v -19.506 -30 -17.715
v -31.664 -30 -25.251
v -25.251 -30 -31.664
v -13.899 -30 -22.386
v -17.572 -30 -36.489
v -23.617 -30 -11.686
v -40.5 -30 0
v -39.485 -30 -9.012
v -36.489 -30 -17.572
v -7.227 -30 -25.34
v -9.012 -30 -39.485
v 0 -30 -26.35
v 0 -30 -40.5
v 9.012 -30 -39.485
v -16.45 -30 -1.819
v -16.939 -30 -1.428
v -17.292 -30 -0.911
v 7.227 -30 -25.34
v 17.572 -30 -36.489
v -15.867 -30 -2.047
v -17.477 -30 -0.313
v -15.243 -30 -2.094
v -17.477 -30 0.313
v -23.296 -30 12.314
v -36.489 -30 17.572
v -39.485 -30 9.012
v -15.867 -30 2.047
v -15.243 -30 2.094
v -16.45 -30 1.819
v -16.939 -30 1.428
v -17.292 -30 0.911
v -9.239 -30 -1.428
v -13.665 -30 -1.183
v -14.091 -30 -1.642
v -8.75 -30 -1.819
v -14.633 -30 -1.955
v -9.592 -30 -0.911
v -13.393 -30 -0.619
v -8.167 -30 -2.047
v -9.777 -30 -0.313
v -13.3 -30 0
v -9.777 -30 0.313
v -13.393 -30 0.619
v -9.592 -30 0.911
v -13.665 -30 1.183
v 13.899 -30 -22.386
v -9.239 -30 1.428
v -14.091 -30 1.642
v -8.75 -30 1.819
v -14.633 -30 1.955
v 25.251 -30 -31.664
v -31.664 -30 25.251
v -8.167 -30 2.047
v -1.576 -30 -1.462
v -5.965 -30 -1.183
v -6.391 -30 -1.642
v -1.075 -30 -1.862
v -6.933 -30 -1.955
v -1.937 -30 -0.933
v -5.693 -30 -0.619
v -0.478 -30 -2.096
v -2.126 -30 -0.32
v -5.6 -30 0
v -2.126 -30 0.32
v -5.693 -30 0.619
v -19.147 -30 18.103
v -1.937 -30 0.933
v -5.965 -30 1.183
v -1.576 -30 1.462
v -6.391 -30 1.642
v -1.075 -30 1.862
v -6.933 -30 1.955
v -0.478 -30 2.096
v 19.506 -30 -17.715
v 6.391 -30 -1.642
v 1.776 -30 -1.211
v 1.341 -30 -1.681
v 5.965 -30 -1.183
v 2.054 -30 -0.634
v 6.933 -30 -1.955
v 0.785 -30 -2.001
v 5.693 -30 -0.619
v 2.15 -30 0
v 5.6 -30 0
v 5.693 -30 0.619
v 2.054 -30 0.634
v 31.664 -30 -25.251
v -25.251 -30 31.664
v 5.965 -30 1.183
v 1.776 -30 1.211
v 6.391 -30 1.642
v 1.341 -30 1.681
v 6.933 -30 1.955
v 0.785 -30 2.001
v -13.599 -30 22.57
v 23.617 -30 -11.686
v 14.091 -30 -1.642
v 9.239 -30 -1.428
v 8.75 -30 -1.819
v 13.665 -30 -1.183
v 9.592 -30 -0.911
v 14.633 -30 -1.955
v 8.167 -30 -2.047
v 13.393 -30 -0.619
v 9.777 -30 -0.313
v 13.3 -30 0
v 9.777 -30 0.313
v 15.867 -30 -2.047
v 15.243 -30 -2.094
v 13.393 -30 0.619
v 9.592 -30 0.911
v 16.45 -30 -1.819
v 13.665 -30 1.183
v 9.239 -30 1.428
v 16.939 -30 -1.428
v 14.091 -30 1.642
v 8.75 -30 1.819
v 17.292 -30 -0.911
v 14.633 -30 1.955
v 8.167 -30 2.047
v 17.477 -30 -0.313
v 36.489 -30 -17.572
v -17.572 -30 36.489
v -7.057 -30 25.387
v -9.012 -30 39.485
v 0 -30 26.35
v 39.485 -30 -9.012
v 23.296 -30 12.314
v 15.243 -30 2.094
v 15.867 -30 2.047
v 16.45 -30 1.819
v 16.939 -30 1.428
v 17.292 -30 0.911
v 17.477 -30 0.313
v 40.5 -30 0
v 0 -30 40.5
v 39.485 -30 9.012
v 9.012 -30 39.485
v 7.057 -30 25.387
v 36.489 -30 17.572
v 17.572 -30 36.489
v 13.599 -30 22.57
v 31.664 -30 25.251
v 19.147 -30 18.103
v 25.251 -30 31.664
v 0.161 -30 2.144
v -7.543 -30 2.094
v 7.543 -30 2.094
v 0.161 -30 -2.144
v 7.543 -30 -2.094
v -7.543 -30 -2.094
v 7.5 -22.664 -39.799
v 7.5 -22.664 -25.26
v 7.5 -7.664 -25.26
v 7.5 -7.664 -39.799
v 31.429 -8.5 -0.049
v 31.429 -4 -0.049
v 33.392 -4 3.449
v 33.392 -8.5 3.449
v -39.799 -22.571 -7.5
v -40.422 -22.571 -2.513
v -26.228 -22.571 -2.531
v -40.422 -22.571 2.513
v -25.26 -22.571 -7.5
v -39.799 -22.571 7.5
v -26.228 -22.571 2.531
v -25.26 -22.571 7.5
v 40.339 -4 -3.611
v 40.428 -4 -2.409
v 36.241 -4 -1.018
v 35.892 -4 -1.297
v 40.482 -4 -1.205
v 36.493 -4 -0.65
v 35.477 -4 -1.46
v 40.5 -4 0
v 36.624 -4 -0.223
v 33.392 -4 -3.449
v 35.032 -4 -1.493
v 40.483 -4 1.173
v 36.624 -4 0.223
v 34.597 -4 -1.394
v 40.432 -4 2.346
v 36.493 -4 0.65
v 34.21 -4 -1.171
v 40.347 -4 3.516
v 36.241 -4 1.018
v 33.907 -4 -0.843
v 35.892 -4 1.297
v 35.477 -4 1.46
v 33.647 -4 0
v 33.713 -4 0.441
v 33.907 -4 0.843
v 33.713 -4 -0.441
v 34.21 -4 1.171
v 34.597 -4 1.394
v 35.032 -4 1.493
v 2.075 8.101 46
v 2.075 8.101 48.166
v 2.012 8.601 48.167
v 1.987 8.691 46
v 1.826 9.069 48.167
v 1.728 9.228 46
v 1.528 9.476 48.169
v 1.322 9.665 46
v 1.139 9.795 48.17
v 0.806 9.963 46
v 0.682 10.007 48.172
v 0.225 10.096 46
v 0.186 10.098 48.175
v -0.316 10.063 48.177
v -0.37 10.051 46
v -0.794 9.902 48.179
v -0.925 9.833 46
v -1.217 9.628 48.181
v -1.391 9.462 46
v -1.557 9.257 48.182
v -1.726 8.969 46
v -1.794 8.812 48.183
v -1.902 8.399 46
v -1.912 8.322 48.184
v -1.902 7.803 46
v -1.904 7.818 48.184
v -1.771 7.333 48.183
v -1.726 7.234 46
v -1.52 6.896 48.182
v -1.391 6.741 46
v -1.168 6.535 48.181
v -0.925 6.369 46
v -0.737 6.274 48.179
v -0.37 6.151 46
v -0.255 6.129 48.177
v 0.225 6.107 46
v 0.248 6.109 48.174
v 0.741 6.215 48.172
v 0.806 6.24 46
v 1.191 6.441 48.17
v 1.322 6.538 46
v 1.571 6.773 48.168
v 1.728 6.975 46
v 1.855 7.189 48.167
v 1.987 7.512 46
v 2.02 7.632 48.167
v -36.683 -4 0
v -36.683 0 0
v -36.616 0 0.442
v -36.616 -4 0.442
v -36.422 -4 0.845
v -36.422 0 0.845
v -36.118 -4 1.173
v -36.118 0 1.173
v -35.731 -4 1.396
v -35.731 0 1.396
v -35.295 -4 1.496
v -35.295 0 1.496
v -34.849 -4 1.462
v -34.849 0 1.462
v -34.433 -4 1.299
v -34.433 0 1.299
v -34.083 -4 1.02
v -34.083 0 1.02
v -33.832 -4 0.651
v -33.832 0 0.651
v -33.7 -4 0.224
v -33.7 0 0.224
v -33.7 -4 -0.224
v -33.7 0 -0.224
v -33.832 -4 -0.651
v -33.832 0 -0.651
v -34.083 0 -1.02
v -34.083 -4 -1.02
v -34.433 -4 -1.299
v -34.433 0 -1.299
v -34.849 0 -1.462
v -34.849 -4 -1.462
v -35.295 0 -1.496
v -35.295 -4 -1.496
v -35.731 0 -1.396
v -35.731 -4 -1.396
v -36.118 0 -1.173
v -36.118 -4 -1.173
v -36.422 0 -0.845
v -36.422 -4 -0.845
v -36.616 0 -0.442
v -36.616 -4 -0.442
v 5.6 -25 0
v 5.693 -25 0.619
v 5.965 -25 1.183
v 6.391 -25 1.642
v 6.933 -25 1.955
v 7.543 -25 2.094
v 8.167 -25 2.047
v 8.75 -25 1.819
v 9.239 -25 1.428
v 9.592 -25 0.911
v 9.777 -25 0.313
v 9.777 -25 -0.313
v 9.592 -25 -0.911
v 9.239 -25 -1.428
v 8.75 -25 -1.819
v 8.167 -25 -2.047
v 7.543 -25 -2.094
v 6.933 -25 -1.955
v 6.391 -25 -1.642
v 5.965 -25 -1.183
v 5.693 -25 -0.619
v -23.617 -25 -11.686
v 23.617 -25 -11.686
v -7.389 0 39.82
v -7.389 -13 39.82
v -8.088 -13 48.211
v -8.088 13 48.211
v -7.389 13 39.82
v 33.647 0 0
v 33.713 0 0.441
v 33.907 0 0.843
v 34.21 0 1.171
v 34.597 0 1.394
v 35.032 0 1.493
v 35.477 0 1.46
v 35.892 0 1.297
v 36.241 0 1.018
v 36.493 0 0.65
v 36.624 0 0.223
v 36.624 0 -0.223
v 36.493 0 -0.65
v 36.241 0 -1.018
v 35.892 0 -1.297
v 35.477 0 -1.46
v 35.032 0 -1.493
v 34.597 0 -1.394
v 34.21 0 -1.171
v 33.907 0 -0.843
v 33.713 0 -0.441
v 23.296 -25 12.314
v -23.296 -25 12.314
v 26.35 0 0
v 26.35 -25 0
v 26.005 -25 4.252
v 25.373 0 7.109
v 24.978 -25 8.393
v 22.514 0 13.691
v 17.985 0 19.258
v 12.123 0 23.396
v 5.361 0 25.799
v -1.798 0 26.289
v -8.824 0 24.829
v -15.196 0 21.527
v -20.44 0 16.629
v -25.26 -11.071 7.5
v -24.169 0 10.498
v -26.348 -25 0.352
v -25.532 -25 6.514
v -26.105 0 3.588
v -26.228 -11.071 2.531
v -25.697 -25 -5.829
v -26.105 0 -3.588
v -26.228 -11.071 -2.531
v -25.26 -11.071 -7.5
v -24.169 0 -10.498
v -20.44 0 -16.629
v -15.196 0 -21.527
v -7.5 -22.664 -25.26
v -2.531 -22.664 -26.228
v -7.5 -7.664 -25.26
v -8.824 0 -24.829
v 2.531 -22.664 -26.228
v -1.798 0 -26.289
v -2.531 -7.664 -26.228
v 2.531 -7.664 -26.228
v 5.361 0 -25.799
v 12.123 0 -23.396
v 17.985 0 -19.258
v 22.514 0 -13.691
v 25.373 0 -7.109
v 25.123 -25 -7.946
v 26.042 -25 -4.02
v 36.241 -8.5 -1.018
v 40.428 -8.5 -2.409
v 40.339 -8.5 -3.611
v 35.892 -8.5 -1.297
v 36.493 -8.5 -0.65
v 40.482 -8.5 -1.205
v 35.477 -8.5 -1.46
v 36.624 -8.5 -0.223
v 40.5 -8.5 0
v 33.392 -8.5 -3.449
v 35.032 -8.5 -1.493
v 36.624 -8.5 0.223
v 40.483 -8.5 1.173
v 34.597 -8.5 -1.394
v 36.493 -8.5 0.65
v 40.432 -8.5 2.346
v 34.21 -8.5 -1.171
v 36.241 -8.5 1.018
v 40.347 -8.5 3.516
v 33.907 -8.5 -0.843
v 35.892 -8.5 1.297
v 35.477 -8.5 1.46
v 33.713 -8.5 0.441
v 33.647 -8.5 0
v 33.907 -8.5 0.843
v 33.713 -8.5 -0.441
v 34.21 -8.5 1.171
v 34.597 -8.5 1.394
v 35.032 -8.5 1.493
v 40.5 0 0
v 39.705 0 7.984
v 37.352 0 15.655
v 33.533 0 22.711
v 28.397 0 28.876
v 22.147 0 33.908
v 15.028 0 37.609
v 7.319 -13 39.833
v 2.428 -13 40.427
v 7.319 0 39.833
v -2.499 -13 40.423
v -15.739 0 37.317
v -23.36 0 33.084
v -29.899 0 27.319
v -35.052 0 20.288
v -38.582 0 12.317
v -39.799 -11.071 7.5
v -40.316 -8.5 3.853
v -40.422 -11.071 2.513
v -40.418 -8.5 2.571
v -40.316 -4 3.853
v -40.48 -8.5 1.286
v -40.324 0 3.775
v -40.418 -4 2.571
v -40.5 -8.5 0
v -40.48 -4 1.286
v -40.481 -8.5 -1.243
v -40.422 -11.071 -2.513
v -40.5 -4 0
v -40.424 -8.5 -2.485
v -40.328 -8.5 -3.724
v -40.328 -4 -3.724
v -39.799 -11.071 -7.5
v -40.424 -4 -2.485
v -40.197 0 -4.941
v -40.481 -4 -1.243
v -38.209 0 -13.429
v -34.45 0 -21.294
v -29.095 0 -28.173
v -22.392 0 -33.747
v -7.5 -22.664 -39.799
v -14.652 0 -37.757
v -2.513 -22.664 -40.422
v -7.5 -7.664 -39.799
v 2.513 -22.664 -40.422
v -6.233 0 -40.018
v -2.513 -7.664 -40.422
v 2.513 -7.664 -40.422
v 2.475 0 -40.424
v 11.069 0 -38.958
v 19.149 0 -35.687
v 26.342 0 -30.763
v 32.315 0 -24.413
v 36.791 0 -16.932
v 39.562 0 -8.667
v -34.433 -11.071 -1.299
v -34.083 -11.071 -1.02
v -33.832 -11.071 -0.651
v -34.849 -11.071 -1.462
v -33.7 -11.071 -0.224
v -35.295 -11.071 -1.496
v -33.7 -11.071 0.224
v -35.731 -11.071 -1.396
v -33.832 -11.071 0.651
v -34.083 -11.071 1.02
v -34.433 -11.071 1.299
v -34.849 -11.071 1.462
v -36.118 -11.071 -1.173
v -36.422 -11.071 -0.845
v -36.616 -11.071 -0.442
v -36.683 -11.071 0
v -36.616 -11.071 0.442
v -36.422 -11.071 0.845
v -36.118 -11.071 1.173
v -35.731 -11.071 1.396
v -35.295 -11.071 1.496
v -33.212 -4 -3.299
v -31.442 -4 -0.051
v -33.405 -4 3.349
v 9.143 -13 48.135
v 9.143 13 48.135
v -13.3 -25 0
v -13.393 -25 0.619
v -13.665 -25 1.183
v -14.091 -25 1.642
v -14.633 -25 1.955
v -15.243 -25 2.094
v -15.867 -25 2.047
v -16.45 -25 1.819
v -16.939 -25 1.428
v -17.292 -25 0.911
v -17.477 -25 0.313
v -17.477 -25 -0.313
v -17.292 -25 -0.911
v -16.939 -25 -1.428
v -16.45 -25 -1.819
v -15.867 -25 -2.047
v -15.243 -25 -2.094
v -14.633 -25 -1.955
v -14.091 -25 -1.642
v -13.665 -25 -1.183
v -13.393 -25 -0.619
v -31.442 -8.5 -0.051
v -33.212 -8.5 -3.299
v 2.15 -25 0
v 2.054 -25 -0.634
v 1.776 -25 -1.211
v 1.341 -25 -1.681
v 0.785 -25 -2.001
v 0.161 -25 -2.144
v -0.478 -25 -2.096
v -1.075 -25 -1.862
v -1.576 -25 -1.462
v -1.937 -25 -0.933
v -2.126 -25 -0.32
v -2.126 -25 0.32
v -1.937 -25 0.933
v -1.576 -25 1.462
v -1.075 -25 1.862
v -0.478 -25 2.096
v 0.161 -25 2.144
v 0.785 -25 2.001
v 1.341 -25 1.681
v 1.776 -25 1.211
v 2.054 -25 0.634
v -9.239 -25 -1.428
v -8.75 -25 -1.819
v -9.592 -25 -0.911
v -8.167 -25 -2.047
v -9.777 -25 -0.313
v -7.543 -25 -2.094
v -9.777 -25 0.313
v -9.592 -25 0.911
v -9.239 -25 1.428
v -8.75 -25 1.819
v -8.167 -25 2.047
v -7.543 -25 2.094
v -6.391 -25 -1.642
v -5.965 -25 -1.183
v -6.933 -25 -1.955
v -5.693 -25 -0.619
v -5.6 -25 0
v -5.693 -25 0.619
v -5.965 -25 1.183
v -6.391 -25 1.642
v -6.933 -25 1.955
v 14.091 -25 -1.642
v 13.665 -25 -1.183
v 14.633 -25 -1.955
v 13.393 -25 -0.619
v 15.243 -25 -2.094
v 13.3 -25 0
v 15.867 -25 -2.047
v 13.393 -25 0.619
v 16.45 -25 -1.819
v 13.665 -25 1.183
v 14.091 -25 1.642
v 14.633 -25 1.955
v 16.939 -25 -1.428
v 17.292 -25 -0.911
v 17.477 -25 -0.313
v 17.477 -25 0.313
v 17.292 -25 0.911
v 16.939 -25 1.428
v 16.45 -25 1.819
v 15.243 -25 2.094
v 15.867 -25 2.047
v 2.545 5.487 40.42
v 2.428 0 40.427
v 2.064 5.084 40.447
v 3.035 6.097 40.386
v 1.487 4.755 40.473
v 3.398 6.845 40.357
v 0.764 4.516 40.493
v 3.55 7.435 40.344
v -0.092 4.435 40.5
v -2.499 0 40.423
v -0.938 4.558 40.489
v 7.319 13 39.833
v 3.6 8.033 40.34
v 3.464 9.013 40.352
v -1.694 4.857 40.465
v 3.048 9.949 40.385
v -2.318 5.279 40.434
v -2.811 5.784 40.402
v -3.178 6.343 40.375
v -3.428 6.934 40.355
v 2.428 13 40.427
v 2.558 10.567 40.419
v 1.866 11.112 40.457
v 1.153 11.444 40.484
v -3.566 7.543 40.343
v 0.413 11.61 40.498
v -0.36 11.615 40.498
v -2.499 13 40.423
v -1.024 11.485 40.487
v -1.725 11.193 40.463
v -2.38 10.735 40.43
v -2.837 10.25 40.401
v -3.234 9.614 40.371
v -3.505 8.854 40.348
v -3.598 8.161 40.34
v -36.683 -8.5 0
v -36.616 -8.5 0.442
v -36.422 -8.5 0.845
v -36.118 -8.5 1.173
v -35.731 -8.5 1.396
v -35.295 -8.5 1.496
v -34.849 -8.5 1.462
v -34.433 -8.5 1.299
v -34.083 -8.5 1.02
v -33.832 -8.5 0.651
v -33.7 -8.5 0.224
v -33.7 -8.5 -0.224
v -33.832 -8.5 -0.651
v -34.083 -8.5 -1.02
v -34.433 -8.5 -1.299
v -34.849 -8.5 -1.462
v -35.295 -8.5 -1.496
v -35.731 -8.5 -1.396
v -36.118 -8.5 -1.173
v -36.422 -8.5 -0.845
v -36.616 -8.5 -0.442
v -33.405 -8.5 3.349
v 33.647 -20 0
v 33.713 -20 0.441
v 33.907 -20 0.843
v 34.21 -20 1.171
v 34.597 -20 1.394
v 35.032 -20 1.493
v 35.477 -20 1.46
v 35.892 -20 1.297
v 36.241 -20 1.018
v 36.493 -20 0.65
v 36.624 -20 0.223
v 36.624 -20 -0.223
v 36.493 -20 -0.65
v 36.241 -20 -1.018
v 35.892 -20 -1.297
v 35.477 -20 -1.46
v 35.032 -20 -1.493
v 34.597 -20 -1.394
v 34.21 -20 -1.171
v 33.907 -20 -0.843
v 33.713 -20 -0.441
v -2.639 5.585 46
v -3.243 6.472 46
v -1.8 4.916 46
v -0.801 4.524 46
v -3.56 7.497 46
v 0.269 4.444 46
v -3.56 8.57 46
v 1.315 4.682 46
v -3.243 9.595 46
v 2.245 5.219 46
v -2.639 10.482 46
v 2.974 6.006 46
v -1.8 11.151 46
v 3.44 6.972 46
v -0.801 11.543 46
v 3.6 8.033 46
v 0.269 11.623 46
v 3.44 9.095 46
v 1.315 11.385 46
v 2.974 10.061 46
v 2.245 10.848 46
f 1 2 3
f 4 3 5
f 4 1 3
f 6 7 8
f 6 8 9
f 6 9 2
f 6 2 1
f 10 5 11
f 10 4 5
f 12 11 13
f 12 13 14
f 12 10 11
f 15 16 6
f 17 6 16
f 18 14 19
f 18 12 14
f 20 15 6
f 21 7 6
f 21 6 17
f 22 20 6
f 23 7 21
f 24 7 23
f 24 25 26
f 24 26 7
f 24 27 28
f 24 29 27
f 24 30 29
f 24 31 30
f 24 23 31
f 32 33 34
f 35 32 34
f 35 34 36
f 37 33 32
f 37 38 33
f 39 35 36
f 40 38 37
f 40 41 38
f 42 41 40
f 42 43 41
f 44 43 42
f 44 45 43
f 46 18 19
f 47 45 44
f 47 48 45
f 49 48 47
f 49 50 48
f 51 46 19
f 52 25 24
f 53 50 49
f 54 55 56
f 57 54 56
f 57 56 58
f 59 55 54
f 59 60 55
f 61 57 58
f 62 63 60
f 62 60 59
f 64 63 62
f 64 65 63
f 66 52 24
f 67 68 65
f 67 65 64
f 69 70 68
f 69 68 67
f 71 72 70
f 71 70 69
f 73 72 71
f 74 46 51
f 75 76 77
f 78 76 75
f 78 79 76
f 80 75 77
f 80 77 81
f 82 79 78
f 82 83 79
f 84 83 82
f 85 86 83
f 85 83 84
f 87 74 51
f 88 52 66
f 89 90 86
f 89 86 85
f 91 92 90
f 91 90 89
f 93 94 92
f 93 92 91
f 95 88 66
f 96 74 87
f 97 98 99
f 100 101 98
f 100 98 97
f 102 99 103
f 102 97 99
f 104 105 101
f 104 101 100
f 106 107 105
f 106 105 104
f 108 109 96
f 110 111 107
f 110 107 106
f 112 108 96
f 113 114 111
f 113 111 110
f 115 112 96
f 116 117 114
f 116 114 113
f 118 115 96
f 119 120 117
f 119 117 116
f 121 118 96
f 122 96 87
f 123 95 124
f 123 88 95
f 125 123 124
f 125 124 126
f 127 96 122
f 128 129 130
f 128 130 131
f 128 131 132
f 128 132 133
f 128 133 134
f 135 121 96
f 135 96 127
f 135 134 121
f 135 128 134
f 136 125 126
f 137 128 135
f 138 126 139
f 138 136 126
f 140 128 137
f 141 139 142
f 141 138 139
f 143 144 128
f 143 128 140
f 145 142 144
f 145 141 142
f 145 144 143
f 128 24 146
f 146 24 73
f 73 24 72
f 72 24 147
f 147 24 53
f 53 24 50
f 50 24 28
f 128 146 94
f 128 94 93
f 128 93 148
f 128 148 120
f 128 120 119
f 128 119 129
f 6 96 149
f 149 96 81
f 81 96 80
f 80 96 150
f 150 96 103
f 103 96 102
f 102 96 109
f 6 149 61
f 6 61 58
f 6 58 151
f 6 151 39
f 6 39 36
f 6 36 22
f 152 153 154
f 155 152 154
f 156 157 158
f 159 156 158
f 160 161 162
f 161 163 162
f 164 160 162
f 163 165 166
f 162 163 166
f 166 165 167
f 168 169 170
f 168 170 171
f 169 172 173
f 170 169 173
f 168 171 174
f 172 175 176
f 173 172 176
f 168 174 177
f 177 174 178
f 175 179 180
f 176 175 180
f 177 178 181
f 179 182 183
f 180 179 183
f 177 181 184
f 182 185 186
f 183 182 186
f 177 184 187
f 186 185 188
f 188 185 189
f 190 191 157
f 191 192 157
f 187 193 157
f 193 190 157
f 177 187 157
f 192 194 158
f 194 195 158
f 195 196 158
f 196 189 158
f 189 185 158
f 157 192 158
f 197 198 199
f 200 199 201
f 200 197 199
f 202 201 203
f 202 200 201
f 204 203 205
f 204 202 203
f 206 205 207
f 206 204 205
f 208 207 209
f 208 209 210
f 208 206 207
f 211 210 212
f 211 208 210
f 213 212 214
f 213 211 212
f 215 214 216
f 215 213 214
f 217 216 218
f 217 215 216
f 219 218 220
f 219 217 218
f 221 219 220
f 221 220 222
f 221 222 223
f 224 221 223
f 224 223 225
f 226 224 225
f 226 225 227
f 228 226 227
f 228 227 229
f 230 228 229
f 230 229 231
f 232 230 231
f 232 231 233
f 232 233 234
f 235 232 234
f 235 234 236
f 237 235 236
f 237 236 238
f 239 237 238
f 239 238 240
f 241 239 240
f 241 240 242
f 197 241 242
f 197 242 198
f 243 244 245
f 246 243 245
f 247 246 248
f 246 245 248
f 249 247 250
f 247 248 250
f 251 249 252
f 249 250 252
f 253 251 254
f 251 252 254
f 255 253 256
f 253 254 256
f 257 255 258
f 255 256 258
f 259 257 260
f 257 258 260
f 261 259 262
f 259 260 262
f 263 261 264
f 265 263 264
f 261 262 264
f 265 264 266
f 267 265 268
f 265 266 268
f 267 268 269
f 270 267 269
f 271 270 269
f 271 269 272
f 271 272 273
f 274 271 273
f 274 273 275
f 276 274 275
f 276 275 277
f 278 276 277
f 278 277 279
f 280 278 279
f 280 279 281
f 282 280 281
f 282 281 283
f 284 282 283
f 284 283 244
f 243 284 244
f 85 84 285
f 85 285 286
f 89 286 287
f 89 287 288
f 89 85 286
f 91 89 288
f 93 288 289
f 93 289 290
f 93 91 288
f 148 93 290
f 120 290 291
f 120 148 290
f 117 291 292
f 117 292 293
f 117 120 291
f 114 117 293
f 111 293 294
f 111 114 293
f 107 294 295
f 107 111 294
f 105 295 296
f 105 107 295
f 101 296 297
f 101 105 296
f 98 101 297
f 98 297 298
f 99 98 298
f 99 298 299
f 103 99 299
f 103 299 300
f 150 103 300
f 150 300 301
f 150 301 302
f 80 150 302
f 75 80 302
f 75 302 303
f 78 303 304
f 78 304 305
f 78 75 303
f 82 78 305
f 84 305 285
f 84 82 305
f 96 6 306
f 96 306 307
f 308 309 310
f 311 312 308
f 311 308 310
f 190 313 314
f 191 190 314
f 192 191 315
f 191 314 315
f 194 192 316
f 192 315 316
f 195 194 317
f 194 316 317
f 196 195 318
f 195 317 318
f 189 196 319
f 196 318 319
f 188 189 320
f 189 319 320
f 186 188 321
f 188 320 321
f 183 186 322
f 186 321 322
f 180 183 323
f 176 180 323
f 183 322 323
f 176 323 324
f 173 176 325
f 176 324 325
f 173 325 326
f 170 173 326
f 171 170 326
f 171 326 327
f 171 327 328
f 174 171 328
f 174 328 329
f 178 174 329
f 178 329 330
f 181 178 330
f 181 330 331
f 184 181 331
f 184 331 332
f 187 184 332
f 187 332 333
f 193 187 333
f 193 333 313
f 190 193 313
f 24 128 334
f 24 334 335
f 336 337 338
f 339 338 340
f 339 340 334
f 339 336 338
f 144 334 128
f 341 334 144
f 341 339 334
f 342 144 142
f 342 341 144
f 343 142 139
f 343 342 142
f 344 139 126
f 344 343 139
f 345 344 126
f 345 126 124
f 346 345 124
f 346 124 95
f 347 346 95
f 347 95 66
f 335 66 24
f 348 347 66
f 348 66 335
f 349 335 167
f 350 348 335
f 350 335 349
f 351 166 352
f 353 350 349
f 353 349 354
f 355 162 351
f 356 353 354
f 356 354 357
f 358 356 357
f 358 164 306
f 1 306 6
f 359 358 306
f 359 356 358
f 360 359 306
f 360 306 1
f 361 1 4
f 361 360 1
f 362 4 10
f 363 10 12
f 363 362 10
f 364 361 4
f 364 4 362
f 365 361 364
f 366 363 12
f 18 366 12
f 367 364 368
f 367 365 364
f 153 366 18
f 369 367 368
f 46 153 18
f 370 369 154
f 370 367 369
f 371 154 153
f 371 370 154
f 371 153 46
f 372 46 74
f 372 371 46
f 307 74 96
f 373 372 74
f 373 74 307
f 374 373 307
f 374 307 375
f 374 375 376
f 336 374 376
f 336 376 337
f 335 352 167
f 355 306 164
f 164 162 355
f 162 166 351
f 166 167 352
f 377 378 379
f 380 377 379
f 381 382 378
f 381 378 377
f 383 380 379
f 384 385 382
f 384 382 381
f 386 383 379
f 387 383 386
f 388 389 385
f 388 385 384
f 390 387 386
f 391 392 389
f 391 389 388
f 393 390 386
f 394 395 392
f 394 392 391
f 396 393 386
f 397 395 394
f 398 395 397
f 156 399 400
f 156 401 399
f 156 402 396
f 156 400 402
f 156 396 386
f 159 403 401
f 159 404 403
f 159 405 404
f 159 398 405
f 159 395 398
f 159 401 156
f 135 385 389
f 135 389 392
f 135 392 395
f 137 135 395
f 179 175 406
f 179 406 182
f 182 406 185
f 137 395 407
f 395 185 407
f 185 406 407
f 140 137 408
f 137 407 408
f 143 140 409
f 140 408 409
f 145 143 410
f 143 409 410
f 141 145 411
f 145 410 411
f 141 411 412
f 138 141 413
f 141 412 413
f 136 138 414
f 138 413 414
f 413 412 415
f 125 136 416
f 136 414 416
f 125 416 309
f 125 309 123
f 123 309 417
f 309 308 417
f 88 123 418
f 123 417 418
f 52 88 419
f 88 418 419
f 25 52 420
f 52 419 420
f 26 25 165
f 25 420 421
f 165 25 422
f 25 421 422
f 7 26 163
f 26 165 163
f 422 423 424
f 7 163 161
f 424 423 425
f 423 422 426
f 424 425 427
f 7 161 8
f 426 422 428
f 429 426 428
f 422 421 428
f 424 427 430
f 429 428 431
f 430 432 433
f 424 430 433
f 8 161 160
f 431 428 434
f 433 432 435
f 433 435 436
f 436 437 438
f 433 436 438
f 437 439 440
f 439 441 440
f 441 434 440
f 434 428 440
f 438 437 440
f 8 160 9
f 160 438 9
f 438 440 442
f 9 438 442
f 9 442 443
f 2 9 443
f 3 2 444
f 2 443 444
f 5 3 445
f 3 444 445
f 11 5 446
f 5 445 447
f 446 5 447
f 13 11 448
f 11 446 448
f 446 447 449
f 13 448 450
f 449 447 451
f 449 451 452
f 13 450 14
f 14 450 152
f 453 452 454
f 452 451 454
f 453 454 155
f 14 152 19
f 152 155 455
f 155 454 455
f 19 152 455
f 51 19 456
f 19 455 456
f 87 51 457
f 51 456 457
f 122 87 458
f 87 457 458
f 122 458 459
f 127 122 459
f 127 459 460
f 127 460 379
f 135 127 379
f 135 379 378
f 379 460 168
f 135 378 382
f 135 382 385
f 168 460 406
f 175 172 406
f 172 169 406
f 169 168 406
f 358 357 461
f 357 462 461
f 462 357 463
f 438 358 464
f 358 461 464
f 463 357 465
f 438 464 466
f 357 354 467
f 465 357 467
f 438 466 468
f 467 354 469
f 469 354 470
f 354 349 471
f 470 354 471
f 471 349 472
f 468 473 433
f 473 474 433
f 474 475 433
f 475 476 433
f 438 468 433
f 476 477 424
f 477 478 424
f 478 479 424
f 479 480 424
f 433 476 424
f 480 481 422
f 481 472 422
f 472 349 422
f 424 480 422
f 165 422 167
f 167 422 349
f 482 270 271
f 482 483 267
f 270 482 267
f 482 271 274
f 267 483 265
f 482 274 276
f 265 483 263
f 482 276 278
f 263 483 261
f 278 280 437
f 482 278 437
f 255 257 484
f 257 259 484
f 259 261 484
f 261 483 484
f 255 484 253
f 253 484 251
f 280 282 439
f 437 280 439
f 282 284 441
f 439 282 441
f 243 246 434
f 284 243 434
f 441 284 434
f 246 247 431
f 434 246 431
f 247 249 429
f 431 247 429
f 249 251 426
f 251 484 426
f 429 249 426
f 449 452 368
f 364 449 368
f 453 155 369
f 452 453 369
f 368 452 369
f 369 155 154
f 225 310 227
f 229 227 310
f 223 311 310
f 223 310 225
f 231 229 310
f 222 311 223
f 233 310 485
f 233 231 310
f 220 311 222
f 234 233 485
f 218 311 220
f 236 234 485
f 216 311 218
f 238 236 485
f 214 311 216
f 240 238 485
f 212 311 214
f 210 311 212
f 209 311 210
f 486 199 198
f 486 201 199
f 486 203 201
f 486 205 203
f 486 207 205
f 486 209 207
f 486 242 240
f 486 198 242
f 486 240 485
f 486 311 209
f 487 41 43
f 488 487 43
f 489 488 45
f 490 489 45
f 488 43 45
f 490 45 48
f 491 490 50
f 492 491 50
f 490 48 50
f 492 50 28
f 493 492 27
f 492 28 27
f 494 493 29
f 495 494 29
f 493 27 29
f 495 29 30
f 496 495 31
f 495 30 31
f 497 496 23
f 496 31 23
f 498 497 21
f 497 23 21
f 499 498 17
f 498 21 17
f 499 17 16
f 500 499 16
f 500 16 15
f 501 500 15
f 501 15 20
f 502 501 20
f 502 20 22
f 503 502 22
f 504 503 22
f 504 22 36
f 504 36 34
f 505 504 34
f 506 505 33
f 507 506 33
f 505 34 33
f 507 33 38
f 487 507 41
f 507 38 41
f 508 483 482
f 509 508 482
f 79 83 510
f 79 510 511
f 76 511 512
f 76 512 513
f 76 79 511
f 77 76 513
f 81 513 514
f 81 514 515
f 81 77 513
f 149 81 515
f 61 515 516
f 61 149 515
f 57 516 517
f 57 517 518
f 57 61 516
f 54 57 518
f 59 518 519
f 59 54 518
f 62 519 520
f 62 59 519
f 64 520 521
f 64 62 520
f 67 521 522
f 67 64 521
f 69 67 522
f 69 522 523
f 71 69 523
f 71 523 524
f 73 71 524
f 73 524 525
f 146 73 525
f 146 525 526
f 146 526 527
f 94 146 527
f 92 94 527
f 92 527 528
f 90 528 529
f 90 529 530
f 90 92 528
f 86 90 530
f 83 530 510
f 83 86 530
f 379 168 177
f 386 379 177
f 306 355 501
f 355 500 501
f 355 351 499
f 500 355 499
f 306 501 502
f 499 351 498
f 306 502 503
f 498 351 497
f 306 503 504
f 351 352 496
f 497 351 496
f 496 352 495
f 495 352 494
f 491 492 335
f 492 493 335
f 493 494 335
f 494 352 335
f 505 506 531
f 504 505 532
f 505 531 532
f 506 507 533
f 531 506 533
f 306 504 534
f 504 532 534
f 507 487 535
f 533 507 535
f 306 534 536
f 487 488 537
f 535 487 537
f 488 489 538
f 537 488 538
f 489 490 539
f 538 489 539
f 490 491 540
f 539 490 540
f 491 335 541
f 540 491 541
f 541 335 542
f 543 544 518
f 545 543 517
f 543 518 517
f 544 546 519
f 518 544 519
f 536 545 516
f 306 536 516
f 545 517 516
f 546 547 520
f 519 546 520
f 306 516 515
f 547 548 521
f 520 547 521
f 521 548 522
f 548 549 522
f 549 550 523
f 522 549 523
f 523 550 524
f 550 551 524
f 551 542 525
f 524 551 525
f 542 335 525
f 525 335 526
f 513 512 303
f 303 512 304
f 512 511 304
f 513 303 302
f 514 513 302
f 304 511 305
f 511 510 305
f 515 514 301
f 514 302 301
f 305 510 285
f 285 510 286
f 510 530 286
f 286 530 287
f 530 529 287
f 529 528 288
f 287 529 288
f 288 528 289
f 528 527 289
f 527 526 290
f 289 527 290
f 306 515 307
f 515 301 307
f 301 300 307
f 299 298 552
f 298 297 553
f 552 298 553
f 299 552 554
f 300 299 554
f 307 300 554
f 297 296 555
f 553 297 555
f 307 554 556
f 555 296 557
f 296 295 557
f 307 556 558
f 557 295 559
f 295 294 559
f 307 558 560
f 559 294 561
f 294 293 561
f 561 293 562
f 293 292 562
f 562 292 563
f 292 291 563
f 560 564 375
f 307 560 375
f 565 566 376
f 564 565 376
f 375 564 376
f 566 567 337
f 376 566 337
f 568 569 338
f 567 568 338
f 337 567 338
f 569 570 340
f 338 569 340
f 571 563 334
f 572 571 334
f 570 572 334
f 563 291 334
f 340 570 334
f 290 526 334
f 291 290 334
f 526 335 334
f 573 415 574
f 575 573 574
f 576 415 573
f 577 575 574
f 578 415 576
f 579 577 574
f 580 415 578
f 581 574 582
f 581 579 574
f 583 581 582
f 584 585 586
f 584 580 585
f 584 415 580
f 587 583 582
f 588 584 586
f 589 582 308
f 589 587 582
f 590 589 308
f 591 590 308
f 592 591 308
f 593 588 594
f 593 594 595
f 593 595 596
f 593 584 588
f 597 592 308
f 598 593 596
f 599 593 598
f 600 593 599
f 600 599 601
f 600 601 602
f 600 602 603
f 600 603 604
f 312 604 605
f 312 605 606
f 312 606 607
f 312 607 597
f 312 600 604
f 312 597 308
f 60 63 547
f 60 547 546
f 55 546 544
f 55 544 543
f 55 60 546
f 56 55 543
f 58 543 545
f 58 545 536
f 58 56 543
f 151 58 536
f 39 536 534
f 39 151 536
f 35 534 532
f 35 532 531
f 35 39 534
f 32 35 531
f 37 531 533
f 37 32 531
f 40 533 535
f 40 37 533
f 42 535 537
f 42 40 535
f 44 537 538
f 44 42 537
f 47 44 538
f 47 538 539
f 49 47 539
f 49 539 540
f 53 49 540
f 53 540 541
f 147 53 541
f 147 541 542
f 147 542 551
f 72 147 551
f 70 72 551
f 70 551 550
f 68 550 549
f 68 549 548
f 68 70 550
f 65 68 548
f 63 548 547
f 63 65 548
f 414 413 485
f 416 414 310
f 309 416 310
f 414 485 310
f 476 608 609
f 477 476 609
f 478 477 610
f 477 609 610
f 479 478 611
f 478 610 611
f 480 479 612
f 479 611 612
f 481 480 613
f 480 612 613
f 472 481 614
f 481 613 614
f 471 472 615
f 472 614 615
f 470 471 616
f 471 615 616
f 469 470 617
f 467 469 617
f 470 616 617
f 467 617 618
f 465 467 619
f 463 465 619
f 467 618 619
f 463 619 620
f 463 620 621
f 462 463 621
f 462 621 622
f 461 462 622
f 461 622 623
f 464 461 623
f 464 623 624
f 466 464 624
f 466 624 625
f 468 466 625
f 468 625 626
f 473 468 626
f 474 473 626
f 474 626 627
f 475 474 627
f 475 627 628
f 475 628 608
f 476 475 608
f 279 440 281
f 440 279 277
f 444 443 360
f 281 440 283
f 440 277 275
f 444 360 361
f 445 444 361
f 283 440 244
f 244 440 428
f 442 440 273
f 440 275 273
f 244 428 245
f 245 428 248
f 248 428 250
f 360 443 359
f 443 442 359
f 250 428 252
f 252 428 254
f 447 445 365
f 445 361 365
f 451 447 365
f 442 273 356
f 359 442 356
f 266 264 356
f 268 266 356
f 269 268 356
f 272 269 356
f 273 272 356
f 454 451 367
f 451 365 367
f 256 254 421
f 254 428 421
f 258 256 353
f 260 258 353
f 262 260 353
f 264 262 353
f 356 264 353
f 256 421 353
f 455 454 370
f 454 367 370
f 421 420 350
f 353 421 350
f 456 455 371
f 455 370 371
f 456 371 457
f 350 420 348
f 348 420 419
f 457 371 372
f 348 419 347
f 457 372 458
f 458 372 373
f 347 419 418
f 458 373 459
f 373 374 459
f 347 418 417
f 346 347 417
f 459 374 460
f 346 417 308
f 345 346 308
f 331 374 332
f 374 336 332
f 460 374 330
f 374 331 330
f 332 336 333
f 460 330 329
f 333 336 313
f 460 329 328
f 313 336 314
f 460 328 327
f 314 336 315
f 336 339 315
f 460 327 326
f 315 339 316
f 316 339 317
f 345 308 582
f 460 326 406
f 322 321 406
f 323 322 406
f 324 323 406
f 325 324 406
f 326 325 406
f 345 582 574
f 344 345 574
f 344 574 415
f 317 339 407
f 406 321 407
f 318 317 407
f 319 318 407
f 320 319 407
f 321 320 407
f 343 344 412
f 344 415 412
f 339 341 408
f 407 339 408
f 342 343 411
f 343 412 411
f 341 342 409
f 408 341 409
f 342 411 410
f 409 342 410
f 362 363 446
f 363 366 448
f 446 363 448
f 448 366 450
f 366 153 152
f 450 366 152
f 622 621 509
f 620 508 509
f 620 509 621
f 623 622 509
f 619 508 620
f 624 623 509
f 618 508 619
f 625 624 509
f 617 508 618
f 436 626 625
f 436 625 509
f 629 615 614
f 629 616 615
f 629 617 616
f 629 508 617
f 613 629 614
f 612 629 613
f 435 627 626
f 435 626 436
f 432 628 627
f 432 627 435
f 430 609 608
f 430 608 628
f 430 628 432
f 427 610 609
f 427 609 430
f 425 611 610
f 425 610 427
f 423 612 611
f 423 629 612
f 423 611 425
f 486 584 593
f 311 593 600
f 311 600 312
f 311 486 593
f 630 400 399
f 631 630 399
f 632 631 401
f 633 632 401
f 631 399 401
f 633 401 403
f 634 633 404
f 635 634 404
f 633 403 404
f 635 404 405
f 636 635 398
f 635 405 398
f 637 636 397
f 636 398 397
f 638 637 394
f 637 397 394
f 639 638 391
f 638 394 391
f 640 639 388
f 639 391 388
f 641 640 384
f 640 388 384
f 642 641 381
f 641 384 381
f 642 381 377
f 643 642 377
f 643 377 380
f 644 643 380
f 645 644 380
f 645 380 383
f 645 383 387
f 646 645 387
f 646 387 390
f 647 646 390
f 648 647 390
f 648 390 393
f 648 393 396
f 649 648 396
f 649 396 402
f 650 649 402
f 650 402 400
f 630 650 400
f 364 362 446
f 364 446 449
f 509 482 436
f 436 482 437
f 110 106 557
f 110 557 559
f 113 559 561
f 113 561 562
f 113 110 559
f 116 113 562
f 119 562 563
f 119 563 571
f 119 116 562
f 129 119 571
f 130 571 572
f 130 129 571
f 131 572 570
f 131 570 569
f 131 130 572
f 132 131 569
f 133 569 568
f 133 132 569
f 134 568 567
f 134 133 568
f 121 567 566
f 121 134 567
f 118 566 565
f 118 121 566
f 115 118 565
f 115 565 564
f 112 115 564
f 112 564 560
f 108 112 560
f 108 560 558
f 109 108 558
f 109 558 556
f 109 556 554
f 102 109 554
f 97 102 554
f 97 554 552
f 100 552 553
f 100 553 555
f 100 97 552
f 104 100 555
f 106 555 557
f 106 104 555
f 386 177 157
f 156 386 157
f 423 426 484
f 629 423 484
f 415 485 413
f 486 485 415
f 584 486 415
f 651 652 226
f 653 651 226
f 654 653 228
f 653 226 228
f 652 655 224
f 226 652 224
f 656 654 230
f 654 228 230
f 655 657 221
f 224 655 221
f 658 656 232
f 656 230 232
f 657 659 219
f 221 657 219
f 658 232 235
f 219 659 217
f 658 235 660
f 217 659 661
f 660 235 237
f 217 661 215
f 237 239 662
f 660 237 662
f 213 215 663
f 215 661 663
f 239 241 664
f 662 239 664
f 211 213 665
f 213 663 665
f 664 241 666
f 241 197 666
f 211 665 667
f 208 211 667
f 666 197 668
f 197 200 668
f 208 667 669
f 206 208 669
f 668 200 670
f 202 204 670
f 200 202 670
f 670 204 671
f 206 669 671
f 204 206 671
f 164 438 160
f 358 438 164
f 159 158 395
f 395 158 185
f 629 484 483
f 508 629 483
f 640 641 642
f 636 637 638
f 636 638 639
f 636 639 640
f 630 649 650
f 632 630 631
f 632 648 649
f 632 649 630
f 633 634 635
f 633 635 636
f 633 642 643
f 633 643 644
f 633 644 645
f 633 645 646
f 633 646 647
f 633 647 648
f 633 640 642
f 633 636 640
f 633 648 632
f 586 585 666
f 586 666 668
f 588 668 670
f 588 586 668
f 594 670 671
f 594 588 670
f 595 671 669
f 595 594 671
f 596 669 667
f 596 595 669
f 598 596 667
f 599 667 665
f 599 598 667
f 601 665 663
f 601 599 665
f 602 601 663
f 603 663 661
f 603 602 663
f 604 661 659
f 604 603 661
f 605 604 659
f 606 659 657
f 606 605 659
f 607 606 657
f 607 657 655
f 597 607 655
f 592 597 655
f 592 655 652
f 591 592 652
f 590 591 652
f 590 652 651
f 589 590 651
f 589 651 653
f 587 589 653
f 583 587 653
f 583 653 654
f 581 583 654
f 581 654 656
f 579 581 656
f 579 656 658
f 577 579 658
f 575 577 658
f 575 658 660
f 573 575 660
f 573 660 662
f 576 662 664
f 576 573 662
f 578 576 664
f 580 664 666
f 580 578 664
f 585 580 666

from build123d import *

# Parameters (mm, degrees)
F0_R      = 40.5
F0_R_2    = 26.35
F1_DEPTH  = 30
F3_R      = 1.5
F3_R_2    = 1.4971843494
F4_DEPTH  = 20
F5_DEPTH  = 4.5
F8_R      = 2.1
F9_DEPTH  = 5
F11_DEPTH = 7.5
F13_DEPTH = 7.5
F15_DEPTH = 13
F16_R     = 3.6
F17_DEPTH = 46
F18_R     = 2
F19_DEPTH = 56.1


with BuildPart() as f1:
    # F0 (on Front) → F1 (new body)
    with BuildSketch(Plane.XZ):
        Circle(F0_R)
        Circle(F0_R_2, mode=Mode.SUBTRACT)
    extrude(amount=F1_DEPTH)

    # F3 (on face) → F4 (cut)
    with BuildSketch(Plane(origin=(0, 0, 0), x_dir=(-1, 0, 0), z_dir=(0, 1, 0))):
        with Locations((35.1829901338, 0)):
            Circle(F3_R)
        with Locations((-35.143841058, 0)):
            Circle(F3_R_2)
    extrude(amount=-F4_DEPTH, mode=Mode.SUBTRACT)


with BuildPart() as f5:
    # F2 (on face) → F5 (new body)
    with BuildSketch(Plane(origin=(0, 0, 0), x_dir=(-1, 0, 0), z_dir=(0, 1, 0))):
        with BuildLine():
            Line((31.4417050999, -0.0505083237), (33.2118794322, -3.2991641201))
            Line((33.2118794322, -3.2991641201), (40.3284073856, -3.7241855136))
            ThreePointArc((40.3284073856, -3.7241855136), (40.4570791032, -1.8640682502), (40.5, 0))
            ThreePointArc((40.5, 0), (40.4540427839, 1.9288396616), (40.3162754351, 3.8533018366))
            Line((40.3162754351, 3.8533018366), (33.4046960151, 3.3494916763))
            Line((33.4046960151, 3.3494916763), (31.4417050999, -0.0505083237))
        make_face()
    extrude(amount=-F5_DEPTH)


with BuildPart() as f5b:
    # F2 (on face) → F5, piece 2 (new body)
    with BuildSketch(Plane(origin=(0, 0, 0), x_dir=(-1, 0, 0), z_dir=(0, 1, 0))):
        with BuildLine():
            ThreePointArc((-40.3470564936, 3.5163947881), (-40.499972404, -0.0472787167), (-40.3387366241, -3.6105854882))
            Line((-40.3387366241, -3.6105854882), (-33.3921143039, -3.4494947623))
            Line((-33.3921143039, -3.4494947623), (-31.4291233886, -0.0494947623))
            Line((-31.4291233886, -0.0494947623), (-33.392132321, 3.44931331))
            Line((-33.392132321, 3.44931331), (-40.3470564936, 3.5163947881))
        make_face()
    extrude(amount=-F5_DEPTH)


with BuildPart() as f5_1:
    # F6: moved
    add(f5.part.moved(Location((0, -4, 0))))


with BuildPart() as f5b_1:
    # F6: moved
    add(f5b.part.moved(Location((0, -4, 0))))


with BuildPart() as f1_1:
    add(f1.part)

    # F7: cut F5b, F5
    add(f5b_1.part, mode=Mode.SUBTRACT)
    add(f5_1.part, mode=Mode.SUBTRACT)

    # F8 (on face) → F9 (join)
    with BuildSketch(Plane.XZ.offset(30)):
        with BuildLine():
            Line((23.2959026648, 12.31354616), (-23.2959026648, 12.31354616))
            ThreePointArc((-23.2959026648, 12.31354616), (-26.3476461649, 0.3521953552), (-23.6167164662, -11.68645384))
            Line((-23.6167164662, -11.68645384), (23.6167164662, -11.68645384))
            ThreePointArc((23.6167164662, -11.68645384), (25.6575815197, -6.0009174763), (26.35, 0))
            ThreePointArc((26.35, 0), (25.5750809893, 6.3433218736), (23.2959026648, 12.31354616))
        make_face()
        with Locations((-15.4, 0)):
            Circle(F8_R, mode=Mode.SUBTRACT)
        with BuildLine():
            ThreePointArc((-9.8, 0), (-7.7, 2.1), (-5.6, 0))
            ThreePointArc((-5.6, 0), (-7.7, -2.1), (-9.8, 0))
        make_face(mode=Mode.SUBTRACT)
        with BuildLine():
            ThreePointArc((-2.15, 0), (0, 2.15), (2.15, 0))
            ThreePointArc((2.15, 0), (0, -2.15), (-2.15, 0))
        make_face(mode=Mode.SUBTRACT)
        with BuildLine():
            ThreePointArc((9.8, 0), (7.7, -2.1), (5.6, 0))
            ThreePointArc((5.6, 0), (7.7, 2.1), (9.8, 0))
        make_face(mode=Mode.SUBTRACT)
        with BuildLine():
            ThreePointArc((17.5, 0), (15.4, -2.1), (13.3, 0))
            ThreePointArc((13.3, 0), (15.4, 2.1), (17.5, 0))
        make_face(mode=Mode.SUBTRACT)
    extrude(amount=-F9_DEPTH)

    # F10 (on Right) → F11 (cut, symmetric)
    with BuildSketch(Plane.YZ):
        Polygon((-7.6641152985, -38.8216372541), (-7.6641152985, -23.0135689676), (-22.6641152985, -23.0135689676), (-22.6641152985, -43.0135689676), (-7.6641152985, -43.0135689676), align=None)
    extrude(amount=F11_DEPTH, both=True, mode=Mode.SUBTRACT)

    # F12 (on Top) → F13 (cut, symmetric)
    with BuildSketch(Plane.XY):
        Polygon((-23.9540541172, -11.0713796305), (-43.9540541172, -11.0713796305), (-43.9540541172, -12.5608391675), (-43.9540541172, -22.5713796305), (-23.9540541172, -22.5713796305), align=None)
    extrude(amount=F13_DEPTH, both=True, mode=Mode.SUBTRACT)

    # F14 (on face) → F15 (join, symmetric)
    with BuildSketch(Plane(origin=(0, 0, 0), x_dir=(-1, 0, 0), z_dir=(0, 1, 0))):
        with BuildLine():
            Line((7.388848836, 39.8202826821), (8.0884635863, 48.2109669128))
            Line((8.0884635863, 48.2109669128), (-9.1429123127, 48.1351951361))
            Line((-9.1429123127, 48.1351951361), (-7.3191832289, 39.8331464595))
            ThreePointArc((-7.3191832289, 39.8331464595), (0.0354216515, 40.49998451), (7.388848836, 39.8202826821))
        make_face()
    extrude(amount=F15_DEPTH, both=True)

    # F16 (on Top) → F17 (cut)
    with BuildSketch(Plane.XY):
        with Locations((0, 8.0334944651)):
            Circle(F16_R)
    extrude(amount=F17_DEPTH, mode=Mode.SUBTRACT)

    # F18 (on Top) → F19 (cut)
    with BuildSketch(Plane.XY):
        with Locations((0.0754839784, 8.1013115123)):
            Circle(F18_R)
    extrude(amount=F19_DEPTH, mode=Mode.SUBTRACT)


solid = f1_1.part
